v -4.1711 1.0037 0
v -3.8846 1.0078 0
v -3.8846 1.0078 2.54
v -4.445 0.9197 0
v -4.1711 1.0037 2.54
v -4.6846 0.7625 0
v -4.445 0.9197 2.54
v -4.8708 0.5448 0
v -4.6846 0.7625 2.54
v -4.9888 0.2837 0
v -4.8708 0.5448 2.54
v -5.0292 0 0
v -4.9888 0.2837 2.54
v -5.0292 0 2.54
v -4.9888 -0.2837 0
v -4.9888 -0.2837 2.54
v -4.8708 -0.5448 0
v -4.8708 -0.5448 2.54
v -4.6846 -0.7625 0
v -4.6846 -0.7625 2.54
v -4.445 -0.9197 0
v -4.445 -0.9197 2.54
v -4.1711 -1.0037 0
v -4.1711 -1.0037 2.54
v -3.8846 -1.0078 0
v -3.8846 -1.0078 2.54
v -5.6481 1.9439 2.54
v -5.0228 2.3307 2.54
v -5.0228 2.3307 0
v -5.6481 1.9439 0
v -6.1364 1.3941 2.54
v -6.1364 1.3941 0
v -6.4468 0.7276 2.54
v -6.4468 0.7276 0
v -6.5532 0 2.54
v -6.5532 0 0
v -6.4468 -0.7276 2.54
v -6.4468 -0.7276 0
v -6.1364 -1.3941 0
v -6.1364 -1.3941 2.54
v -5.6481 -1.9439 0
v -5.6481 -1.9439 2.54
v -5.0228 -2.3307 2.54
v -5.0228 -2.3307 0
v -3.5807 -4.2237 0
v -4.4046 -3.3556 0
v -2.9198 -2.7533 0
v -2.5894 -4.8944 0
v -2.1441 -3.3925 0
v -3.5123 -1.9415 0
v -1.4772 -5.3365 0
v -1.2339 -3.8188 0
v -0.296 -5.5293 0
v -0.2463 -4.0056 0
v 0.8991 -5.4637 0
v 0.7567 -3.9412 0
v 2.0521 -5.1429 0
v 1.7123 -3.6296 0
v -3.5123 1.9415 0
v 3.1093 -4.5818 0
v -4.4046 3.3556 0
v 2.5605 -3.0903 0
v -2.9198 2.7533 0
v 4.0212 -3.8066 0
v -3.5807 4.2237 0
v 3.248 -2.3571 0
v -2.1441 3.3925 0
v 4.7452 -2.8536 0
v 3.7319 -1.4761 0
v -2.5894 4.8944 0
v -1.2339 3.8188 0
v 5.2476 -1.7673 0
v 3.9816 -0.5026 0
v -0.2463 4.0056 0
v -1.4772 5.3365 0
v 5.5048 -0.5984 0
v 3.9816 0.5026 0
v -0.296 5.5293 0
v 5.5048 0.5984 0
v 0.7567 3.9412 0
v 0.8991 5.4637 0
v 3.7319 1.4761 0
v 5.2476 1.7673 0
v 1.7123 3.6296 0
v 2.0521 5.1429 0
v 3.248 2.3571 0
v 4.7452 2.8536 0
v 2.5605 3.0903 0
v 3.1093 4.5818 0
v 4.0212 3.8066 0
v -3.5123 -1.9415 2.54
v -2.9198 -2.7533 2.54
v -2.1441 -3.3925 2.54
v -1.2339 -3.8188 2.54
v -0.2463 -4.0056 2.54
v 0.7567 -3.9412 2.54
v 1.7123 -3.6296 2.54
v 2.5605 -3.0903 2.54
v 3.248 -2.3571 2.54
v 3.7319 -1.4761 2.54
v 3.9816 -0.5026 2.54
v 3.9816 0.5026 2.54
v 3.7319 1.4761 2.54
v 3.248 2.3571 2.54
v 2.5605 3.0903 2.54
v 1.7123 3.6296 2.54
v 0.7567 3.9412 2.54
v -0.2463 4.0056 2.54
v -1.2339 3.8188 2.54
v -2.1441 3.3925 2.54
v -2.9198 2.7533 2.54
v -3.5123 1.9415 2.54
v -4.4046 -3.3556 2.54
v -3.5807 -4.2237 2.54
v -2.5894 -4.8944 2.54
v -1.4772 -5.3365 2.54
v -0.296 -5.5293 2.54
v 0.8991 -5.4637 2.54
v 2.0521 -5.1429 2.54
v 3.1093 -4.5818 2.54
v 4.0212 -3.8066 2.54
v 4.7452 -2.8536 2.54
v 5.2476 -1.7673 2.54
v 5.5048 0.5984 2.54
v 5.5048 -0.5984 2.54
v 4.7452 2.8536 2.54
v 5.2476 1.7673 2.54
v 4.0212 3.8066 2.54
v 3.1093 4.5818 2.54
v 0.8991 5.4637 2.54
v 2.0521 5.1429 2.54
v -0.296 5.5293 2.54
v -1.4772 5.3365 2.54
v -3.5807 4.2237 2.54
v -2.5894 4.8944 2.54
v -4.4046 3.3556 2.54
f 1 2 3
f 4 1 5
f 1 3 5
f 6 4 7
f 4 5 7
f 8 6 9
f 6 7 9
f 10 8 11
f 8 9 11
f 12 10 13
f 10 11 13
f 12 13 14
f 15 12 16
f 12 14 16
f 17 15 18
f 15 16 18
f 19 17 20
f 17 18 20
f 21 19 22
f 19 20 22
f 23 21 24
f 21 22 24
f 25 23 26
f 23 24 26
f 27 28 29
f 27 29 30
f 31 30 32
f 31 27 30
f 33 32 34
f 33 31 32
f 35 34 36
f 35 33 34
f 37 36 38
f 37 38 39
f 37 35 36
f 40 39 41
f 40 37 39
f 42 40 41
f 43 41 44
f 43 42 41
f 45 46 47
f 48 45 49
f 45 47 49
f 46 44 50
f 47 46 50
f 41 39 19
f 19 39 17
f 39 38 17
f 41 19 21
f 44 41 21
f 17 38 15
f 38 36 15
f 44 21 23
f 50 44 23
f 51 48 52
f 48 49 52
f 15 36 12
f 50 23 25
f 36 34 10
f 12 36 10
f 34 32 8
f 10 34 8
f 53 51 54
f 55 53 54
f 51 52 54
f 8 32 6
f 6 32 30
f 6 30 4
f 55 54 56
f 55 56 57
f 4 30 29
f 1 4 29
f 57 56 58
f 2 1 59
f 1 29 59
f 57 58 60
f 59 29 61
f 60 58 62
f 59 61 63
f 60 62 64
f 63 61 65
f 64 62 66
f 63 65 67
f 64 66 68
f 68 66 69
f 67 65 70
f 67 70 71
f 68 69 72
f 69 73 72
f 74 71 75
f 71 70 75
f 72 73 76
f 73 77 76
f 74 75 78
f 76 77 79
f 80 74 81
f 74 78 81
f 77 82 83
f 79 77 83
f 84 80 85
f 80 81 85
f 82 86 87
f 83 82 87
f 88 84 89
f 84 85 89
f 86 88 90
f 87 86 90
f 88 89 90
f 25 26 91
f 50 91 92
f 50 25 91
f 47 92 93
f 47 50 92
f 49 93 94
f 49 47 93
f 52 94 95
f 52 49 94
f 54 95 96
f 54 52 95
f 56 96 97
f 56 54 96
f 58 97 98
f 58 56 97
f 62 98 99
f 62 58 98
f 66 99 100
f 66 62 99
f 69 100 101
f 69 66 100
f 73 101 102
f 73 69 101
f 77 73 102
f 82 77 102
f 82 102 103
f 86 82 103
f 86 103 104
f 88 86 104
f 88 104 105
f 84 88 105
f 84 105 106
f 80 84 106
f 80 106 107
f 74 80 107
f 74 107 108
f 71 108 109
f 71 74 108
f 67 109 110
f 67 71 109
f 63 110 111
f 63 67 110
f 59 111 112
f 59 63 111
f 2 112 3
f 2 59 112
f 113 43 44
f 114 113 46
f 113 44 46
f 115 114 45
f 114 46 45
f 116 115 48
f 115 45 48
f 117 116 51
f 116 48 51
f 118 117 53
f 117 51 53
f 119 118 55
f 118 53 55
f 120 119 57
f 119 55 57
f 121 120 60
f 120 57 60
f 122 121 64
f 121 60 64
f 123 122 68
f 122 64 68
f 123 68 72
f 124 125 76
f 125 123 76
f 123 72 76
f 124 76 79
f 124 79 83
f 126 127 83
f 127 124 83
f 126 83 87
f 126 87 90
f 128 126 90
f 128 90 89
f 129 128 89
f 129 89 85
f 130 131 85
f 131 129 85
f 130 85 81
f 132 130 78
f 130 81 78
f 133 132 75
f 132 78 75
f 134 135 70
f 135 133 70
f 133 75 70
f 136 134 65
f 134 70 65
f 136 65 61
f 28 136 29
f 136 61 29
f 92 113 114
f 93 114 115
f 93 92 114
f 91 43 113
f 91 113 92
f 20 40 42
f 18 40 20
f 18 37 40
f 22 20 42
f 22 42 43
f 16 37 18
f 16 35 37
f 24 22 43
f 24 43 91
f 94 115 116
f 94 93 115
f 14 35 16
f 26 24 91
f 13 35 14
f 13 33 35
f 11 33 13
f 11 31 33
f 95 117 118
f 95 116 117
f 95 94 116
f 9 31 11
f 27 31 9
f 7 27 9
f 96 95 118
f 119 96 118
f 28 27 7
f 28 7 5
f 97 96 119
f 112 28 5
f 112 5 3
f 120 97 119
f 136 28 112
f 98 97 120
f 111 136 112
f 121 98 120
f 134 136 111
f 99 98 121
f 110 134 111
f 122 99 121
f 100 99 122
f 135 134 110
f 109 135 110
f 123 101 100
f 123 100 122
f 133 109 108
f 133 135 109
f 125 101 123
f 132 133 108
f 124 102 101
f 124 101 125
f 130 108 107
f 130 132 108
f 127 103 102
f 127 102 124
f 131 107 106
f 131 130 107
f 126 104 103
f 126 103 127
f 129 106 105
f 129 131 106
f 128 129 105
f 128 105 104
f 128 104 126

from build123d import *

# Parameters (mm, degrees)
F0_R     = 5.5372
F0_R_2   = 4.0132
F1_DEPTH = 2.54
F3_DEPTH = 2.541
F5_DEPTH = 2.54


with BuildPart() as f1:
    # F0 (on Top) → F1 (new body)
    with BuildSketch(Plane.XY):
        Circle(F0_R)
        Circle(F0_R_2, mode=Mode.SUBTRACT)
    extrude(amount=F1_DEPTH)

    # F2 (on face) → F3 (cut, through all)
    with BuildSketch(Plane.XY.offset(2.54)):
        with BuildLine():
            ThreePointArc((-3.884592, -1.007827), (-4.0132, 0), (-3.884592, 1.007827))
            ThreePointArc((-3.884592, 1.007827), (-5.0292, 0), (-3.884592, -1.007827))
        make_face()
    extrude(amount=-F3_DEPTH, mode=Mode.SUBTRACT)

    # F4 (on face) → F5 (join, through all)
    with BuildSketch(Plane.XY.offset(2.54)):
        with BuildLine():
            ThreePointArc((-5.02277, -2.330744), (-5.5372, 0), (-5.02277, 2.330744))
            ThreePointArc((-5.02277, 2.330744), (-6.5532, 0), (-5.02277, -2.330744))
        make_face()
    extrude(amount=-F5_DEPTH)


solid = f1.part
